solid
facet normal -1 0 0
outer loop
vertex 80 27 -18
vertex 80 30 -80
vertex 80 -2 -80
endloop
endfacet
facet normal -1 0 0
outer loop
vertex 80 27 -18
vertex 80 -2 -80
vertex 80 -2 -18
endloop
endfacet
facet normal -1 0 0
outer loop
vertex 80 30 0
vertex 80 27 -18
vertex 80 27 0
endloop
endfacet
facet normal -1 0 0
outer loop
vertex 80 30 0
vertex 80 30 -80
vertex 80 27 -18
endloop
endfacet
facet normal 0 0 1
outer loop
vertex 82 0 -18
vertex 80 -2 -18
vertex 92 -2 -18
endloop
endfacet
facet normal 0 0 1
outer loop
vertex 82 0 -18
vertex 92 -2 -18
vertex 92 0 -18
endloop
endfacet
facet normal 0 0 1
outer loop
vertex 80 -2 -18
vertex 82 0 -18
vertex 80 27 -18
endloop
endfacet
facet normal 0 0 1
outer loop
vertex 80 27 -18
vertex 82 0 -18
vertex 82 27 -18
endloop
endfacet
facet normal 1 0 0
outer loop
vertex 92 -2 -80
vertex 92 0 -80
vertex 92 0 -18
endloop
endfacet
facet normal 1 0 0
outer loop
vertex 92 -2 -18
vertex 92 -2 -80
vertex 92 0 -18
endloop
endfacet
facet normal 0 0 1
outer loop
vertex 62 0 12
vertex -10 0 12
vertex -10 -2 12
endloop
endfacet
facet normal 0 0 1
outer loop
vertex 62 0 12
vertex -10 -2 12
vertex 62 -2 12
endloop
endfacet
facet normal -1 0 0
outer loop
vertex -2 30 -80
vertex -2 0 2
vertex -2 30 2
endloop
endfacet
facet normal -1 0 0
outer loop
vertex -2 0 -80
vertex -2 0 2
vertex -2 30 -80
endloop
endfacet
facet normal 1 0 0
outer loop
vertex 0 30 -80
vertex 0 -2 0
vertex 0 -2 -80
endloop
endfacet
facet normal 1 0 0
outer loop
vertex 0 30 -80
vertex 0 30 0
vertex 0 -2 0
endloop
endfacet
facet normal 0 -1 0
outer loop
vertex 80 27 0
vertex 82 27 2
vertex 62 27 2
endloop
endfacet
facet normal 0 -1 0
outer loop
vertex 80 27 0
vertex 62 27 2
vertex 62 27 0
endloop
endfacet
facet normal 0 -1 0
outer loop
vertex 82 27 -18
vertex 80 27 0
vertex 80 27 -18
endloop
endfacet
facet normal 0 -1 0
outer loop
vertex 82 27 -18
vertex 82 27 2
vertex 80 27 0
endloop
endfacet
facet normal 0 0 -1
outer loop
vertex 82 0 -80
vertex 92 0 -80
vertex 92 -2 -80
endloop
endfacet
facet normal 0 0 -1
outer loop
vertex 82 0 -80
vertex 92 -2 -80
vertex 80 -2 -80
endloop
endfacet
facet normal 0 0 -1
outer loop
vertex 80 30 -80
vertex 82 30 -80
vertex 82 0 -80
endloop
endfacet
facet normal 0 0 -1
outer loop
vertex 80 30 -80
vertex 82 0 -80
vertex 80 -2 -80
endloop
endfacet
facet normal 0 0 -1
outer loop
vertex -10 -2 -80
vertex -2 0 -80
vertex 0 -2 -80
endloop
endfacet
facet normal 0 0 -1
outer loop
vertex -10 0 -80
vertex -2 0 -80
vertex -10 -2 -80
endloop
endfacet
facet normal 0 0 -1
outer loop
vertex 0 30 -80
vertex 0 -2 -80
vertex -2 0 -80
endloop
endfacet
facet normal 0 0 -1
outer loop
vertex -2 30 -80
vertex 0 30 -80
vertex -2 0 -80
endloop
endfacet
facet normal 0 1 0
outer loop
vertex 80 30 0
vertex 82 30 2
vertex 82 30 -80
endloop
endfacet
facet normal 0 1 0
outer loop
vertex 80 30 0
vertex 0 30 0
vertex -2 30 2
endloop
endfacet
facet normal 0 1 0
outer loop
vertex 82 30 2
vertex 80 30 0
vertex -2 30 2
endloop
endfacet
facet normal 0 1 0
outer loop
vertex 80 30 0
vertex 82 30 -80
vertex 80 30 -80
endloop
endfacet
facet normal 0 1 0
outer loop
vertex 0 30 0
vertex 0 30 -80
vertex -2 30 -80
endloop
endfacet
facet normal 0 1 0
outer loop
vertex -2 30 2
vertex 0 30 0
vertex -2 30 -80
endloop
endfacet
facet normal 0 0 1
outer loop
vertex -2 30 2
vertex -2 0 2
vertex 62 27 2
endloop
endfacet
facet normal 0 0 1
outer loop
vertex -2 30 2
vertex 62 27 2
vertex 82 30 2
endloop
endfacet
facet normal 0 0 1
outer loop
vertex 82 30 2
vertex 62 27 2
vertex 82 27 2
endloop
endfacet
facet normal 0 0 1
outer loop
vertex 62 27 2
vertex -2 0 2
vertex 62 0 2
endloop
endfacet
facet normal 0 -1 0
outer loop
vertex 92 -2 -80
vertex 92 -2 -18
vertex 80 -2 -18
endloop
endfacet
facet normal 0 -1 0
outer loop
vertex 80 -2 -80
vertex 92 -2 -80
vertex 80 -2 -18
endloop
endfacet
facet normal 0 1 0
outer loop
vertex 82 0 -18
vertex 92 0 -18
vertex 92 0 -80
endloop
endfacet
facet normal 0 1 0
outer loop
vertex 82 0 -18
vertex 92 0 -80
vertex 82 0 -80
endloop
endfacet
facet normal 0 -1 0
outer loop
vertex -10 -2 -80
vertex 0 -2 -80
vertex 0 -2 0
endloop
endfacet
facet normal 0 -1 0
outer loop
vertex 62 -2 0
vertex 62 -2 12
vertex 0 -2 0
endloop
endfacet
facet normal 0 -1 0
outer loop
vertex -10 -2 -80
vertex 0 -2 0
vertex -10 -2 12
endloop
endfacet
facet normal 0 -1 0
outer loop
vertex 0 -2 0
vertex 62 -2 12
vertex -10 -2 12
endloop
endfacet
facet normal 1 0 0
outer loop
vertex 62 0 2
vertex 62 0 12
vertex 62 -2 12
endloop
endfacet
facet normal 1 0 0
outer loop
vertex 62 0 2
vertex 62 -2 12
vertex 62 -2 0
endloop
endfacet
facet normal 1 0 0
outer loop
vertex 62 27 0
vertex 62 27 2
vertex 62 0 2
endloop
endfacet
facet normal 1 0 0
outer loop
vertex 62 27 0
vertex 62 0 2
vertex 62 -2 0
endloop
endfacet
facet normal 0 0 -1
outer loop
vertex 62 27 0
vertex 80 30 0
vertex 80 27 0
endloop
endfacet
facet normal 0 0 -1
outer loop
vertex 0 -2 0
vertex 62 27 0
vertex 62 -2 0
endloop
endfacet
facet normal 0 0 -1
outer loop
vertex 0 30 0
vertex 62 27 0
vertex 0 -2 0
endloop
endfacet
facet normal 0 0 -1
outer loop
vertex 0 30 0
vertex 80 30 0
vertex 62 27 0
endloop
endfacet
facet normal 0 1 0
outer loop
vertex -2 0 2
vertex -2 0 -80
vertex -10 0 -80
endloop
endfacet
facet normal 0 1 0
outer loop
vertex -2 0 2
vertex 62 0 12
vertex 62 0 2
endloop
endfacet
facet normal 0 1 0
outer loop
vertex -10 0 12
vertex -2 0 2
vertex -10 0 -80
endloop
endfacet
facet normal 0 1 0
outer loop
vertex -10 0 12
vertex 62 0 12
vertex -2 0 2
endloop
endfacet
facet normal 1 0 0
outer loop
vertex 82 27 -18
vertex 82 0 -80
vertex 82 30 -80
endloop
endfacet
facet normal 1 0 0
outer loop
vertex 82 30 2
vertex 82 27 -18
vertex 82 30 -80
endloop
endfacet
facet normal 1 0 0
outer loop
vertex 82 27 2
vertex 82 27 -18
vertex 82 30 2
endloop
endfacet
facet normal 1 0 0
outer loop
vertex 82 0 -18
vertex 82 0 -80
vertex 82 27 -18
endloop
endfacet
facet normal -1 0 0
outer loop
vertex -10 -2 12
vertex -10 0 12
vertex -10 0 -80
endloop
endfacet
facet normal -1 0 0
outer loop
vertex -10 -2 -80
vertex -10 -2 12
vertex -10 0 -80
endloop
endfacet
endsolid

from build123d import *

# Parameters (mm, degrees)
BOSS_EXTRUDE1_DEPTH = 30
SKETCH2_W           = 20
SKETCH2_H           = 20
CUT_EXTRUDE1_DEPTH  = 20
BOSS_EXTRUDE2_DEPTH = 2
SKETCH4_W           = 30
SKETCH4_H           = 2
CUT_EXTRUDE2_DEPTH  = 30
SKETCH5_W           = 20
SKETCH5_H           = 7
CUT_EXTRUDE3_DEPTH  = 20


with BuildPart() as part:
    # Sketch1 → Boss-Extrude1 (new body)
    with BuildSketch(Plane(origin=(0, 0, 0), x_dir=(1, 0, 0), z_dir=(0, 1, 0))):
        Polygon((0, 0), (80, 0), (80, 80), (82, 80), (82, -2), (80, -2), (-2, -2), (-2, 80), (0, 80), align=None)
    extrude(amount=BOSS_EXTRUDE1_DEPTH)

    # Sketch2 → Cut-Extrude1 (cut)
    with BuildSketch(Plane(origin=(82, 0, 0), x_dir=(0, 0, -1), z_dir=(1, 0, 0))):
        with Locations((8, 10)):
            Rectangle(SKETCH2_W, SKETCH2_H)
    extrude(amount=-CUT_EXTRUDE1_DEPTH, mode=Mode.SUBTRACT)

    # Sketch3 → Boss-Extrude2 (add)
    with BuildSketch(Plane.XZ):
        Polygon((0, -80), (-10, -80), (-10, 7.412942582), (-10, 12), (92, 12), (92, 2), (92, -80), (80, -80), (80, 0), (0, 0), align=None)
    extrude(amount=BOSS_EXTRUDE2_DEPTH)

    # Sketch4 → Cut-Extrude2 (cut)
    with BuildSketch(Plane(origin=(92, 0, 0), x_dir=(0, 0, -1), z_dir=(1, 0, 0))):
        with Locations((3, -1)):
            Rectangle(SKETCH4_W, SKETCH4_H)
    extrude(amount=-CUT_EXTRUDE2_DEPTH, mode=Mode.SUBTRACT)

    # Sketch5 → Cut-Extrude3 (cut)
    with BuildSketch(Plane(origin=(82, 0, 0), x_dir=(0, 0, -1), z_dir=(1, 0, 0))):
        with Locations((8, 23.5)):
            Rectangle(SKETCH5_W, SKETCH5_H)
    extrude(amount=-CUT_EXTRUDE3_DEPTH, mode=Mode.SUBTRACT)


solid = part.part
